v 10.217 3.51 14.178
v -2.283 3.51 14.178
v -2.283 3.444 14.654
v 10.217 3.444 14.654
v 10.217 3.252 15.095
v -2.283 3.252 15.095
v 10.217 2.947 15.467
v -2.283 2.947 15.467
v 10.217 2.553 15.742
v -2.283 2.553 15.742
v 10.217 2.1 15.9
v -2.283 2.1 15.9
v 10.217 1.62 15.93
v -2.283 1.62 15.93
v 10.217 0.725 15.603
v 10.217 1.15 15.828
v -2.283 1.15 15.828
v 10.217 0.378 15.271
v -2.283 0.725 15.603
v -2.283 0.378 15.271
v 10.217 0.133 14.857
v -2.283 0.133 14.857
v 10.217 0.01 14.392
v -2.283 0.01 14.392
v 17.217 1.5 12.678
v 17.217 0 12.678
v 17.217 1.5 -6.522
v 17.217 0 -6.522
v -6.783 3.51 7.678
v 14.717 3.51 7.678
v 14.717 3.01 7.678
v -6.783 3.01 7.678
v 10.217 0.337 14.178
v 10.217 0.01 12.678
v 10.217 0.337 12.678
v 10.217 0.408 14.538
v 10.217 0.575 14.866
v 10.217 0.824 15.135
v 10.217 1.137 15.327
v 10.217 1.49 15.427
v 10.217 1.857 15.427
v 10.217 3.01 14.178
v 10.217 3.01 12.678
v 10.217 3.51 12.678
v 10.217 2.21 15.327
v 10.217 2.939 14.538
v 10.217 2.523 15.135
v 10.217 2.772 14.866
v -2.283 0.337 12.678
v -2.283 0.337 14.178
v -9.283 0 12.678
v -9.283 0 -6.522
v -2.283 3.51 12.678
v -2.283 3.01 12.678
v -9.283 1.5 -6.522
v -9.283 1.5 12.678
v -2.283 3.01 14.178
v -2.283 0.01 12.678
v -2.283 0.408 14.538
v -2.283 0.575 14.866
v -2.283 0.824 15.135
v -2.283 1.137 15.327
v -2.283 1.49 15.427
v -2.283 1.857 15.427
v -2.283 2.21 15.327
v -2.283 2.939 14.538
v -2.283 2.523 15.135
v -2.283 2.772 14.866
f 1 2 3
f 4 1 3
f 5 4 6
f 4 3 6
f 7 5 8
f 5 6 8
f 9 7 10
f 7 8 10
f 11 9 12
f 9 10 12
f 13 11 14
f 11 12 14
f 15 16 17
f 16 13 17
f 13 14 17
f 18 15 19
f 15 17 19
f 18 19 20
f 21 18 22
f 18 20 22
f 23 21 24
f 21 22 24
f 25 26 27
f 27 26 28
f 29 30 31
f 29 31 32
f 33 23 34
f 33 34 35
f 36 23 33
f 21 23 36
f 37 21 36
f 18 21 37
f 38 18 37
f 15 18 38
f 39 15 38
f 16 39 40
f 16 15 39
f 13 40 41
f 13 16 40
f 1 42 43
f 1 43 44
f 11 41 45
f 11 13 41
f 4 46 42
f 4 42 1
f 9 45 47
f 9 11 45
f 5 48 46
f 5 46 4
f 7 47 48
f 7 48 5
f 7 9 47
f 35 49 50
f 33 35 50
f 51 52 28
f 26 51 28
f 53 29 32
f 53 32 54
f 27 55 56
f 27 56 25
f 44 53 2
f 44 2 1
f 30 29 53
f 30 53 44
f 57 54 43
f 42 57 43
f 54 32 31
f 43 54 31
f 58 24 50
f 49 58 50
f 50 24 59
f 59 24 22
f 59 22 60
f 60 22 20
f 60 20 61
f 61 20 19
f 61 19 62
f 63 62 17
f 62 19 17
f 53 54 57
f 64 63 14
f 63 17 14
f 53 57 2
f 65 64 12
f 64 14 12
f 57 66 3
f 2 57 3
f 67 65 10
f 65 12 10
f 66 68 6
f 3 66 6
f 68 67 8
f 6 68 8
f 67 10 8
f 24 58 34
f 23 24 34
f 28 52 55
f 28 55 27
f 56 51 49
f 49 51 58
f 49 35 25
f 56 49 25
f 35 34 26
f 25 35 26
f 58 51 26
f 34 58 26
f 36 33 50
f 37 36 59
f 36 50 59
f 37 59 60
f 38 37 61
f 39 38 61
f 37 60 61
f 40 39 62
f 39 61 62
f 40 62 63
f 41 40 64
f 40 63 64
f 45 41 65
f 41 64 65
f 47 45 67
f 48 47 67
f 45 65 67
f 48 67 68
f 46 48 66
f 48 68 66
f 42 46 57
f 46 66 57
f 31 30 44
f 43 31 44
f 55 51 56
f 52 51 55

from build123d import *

# Parameters (mm, degrees)
SKETCH1_W           = 26.5
SKETCH1_H           = 19.2
BOSS_EXTRUDE1_DEPTH = 1.5
SKETCH2_W           = 12.5
SKETCH2_H           = 3.5
BOSS_EXTRUDE2_DEPTH = 3.5
CUT_EXTRUDE1_DEPTH  = 18
SKETCH4_W           = 12.5
SKETCH4_H           = 0.5
BOSS_EXTRUDE3_DEPTH = 5
BOSS_EXTRUDE4_DEPTH = 0.5


with BuildPart() as part:
    # Sketch1 → Boss-Extrude1 (new body)
    with BuildSketch(Plane(origin=(0, 0, 0), x_dir=(1, 0, 0), z_dir=(0, 1, 0))):
        with Locations((3.967391304, -3.07826087)):
            Rectangle(SKETCH1_W, SKETCH1_H)
    extrude(amount=BOSS_EXTRUDE1_DEPTH)

    # Sketch2 → Boss-Extrude2 (add)
    with BuildSketch(Plane.XY.offset(12.67826087)):
        with Locations((3.967391304, 1.76)):
            Rectangle(SKETCH2_W, SKETCH2_H)
    extrude(amount=BOSS_EXTRUDE2_DEPTH)

    # Sketch3 → Cut-Extrude1 (cut)
    with BuildSketch(Plane.ZY.offset(2.282608696)):
        with BuildLine():
            Line((14.17826087, 3.01), (12.67826087, 3.01))
            Line((12.67826087, 3.01), (12.67826087, 1.5))
            Line((12.67826087, 1.5), (12.67826087, 0.336807219))
            Line((12.67826087, 0.336807219), (14.17826087, 0.336807219))
            ThreePointArc((14.17826087, 0.336807219), (15.439541787, 1.67340361), (14.17826087, 3.01))
        make_face()
        with BuildLine():
            Line((16.17826087, 3.51), (14.17826087, 3.51))
            ThreePointArc((14.17826087, 3.51), (15.93151881, 1.860671544), (14.392294136, 0.01))
            Line((14.392294136, 0.01), (16.17826087, 0.01))
            Line((16.17826087, 0.01), (16.17826087, 3.51))
        make_face()
    extrude(amount=-CUT_EXTRUDE1_DEPTH, mode=Mode.SUBTRACT)

    # Sketch4 → Boss-Extrude3 (add)
    with BuildSketch(Plane(origin=(0, 0, 12.67826087), x_dir=(-1, 0, 0), z_dir=(0, 0, -1))):
        with Locations((-3.967391304, 3.26)):
            Rectangle(SKETCH4_W, SKETCH4_H)
    extrude(amount=BOSS_EXTRUDE3_DEPTH)

    # Sketch6 → Boss-Extrude4 (add)
    with BuildSketch(Plane(origin=(0, 3.51, 0), x_dir=(1, 0, 0), z_dir=(0, 1, 0))):
        Polygon((-2.282608696, -7.67826087), (-6.782608696, -7.67826087), (-2.282608696, -12.67826087), align=None)
        Polygon((10.217391304, -7.67826087), (14.717391304, -7.67826087), (10.217391304, -12.67826087), align=None)
    extrude(amount=-BOSS_EXTRUDE4_DEPTH)


solid = part.part
